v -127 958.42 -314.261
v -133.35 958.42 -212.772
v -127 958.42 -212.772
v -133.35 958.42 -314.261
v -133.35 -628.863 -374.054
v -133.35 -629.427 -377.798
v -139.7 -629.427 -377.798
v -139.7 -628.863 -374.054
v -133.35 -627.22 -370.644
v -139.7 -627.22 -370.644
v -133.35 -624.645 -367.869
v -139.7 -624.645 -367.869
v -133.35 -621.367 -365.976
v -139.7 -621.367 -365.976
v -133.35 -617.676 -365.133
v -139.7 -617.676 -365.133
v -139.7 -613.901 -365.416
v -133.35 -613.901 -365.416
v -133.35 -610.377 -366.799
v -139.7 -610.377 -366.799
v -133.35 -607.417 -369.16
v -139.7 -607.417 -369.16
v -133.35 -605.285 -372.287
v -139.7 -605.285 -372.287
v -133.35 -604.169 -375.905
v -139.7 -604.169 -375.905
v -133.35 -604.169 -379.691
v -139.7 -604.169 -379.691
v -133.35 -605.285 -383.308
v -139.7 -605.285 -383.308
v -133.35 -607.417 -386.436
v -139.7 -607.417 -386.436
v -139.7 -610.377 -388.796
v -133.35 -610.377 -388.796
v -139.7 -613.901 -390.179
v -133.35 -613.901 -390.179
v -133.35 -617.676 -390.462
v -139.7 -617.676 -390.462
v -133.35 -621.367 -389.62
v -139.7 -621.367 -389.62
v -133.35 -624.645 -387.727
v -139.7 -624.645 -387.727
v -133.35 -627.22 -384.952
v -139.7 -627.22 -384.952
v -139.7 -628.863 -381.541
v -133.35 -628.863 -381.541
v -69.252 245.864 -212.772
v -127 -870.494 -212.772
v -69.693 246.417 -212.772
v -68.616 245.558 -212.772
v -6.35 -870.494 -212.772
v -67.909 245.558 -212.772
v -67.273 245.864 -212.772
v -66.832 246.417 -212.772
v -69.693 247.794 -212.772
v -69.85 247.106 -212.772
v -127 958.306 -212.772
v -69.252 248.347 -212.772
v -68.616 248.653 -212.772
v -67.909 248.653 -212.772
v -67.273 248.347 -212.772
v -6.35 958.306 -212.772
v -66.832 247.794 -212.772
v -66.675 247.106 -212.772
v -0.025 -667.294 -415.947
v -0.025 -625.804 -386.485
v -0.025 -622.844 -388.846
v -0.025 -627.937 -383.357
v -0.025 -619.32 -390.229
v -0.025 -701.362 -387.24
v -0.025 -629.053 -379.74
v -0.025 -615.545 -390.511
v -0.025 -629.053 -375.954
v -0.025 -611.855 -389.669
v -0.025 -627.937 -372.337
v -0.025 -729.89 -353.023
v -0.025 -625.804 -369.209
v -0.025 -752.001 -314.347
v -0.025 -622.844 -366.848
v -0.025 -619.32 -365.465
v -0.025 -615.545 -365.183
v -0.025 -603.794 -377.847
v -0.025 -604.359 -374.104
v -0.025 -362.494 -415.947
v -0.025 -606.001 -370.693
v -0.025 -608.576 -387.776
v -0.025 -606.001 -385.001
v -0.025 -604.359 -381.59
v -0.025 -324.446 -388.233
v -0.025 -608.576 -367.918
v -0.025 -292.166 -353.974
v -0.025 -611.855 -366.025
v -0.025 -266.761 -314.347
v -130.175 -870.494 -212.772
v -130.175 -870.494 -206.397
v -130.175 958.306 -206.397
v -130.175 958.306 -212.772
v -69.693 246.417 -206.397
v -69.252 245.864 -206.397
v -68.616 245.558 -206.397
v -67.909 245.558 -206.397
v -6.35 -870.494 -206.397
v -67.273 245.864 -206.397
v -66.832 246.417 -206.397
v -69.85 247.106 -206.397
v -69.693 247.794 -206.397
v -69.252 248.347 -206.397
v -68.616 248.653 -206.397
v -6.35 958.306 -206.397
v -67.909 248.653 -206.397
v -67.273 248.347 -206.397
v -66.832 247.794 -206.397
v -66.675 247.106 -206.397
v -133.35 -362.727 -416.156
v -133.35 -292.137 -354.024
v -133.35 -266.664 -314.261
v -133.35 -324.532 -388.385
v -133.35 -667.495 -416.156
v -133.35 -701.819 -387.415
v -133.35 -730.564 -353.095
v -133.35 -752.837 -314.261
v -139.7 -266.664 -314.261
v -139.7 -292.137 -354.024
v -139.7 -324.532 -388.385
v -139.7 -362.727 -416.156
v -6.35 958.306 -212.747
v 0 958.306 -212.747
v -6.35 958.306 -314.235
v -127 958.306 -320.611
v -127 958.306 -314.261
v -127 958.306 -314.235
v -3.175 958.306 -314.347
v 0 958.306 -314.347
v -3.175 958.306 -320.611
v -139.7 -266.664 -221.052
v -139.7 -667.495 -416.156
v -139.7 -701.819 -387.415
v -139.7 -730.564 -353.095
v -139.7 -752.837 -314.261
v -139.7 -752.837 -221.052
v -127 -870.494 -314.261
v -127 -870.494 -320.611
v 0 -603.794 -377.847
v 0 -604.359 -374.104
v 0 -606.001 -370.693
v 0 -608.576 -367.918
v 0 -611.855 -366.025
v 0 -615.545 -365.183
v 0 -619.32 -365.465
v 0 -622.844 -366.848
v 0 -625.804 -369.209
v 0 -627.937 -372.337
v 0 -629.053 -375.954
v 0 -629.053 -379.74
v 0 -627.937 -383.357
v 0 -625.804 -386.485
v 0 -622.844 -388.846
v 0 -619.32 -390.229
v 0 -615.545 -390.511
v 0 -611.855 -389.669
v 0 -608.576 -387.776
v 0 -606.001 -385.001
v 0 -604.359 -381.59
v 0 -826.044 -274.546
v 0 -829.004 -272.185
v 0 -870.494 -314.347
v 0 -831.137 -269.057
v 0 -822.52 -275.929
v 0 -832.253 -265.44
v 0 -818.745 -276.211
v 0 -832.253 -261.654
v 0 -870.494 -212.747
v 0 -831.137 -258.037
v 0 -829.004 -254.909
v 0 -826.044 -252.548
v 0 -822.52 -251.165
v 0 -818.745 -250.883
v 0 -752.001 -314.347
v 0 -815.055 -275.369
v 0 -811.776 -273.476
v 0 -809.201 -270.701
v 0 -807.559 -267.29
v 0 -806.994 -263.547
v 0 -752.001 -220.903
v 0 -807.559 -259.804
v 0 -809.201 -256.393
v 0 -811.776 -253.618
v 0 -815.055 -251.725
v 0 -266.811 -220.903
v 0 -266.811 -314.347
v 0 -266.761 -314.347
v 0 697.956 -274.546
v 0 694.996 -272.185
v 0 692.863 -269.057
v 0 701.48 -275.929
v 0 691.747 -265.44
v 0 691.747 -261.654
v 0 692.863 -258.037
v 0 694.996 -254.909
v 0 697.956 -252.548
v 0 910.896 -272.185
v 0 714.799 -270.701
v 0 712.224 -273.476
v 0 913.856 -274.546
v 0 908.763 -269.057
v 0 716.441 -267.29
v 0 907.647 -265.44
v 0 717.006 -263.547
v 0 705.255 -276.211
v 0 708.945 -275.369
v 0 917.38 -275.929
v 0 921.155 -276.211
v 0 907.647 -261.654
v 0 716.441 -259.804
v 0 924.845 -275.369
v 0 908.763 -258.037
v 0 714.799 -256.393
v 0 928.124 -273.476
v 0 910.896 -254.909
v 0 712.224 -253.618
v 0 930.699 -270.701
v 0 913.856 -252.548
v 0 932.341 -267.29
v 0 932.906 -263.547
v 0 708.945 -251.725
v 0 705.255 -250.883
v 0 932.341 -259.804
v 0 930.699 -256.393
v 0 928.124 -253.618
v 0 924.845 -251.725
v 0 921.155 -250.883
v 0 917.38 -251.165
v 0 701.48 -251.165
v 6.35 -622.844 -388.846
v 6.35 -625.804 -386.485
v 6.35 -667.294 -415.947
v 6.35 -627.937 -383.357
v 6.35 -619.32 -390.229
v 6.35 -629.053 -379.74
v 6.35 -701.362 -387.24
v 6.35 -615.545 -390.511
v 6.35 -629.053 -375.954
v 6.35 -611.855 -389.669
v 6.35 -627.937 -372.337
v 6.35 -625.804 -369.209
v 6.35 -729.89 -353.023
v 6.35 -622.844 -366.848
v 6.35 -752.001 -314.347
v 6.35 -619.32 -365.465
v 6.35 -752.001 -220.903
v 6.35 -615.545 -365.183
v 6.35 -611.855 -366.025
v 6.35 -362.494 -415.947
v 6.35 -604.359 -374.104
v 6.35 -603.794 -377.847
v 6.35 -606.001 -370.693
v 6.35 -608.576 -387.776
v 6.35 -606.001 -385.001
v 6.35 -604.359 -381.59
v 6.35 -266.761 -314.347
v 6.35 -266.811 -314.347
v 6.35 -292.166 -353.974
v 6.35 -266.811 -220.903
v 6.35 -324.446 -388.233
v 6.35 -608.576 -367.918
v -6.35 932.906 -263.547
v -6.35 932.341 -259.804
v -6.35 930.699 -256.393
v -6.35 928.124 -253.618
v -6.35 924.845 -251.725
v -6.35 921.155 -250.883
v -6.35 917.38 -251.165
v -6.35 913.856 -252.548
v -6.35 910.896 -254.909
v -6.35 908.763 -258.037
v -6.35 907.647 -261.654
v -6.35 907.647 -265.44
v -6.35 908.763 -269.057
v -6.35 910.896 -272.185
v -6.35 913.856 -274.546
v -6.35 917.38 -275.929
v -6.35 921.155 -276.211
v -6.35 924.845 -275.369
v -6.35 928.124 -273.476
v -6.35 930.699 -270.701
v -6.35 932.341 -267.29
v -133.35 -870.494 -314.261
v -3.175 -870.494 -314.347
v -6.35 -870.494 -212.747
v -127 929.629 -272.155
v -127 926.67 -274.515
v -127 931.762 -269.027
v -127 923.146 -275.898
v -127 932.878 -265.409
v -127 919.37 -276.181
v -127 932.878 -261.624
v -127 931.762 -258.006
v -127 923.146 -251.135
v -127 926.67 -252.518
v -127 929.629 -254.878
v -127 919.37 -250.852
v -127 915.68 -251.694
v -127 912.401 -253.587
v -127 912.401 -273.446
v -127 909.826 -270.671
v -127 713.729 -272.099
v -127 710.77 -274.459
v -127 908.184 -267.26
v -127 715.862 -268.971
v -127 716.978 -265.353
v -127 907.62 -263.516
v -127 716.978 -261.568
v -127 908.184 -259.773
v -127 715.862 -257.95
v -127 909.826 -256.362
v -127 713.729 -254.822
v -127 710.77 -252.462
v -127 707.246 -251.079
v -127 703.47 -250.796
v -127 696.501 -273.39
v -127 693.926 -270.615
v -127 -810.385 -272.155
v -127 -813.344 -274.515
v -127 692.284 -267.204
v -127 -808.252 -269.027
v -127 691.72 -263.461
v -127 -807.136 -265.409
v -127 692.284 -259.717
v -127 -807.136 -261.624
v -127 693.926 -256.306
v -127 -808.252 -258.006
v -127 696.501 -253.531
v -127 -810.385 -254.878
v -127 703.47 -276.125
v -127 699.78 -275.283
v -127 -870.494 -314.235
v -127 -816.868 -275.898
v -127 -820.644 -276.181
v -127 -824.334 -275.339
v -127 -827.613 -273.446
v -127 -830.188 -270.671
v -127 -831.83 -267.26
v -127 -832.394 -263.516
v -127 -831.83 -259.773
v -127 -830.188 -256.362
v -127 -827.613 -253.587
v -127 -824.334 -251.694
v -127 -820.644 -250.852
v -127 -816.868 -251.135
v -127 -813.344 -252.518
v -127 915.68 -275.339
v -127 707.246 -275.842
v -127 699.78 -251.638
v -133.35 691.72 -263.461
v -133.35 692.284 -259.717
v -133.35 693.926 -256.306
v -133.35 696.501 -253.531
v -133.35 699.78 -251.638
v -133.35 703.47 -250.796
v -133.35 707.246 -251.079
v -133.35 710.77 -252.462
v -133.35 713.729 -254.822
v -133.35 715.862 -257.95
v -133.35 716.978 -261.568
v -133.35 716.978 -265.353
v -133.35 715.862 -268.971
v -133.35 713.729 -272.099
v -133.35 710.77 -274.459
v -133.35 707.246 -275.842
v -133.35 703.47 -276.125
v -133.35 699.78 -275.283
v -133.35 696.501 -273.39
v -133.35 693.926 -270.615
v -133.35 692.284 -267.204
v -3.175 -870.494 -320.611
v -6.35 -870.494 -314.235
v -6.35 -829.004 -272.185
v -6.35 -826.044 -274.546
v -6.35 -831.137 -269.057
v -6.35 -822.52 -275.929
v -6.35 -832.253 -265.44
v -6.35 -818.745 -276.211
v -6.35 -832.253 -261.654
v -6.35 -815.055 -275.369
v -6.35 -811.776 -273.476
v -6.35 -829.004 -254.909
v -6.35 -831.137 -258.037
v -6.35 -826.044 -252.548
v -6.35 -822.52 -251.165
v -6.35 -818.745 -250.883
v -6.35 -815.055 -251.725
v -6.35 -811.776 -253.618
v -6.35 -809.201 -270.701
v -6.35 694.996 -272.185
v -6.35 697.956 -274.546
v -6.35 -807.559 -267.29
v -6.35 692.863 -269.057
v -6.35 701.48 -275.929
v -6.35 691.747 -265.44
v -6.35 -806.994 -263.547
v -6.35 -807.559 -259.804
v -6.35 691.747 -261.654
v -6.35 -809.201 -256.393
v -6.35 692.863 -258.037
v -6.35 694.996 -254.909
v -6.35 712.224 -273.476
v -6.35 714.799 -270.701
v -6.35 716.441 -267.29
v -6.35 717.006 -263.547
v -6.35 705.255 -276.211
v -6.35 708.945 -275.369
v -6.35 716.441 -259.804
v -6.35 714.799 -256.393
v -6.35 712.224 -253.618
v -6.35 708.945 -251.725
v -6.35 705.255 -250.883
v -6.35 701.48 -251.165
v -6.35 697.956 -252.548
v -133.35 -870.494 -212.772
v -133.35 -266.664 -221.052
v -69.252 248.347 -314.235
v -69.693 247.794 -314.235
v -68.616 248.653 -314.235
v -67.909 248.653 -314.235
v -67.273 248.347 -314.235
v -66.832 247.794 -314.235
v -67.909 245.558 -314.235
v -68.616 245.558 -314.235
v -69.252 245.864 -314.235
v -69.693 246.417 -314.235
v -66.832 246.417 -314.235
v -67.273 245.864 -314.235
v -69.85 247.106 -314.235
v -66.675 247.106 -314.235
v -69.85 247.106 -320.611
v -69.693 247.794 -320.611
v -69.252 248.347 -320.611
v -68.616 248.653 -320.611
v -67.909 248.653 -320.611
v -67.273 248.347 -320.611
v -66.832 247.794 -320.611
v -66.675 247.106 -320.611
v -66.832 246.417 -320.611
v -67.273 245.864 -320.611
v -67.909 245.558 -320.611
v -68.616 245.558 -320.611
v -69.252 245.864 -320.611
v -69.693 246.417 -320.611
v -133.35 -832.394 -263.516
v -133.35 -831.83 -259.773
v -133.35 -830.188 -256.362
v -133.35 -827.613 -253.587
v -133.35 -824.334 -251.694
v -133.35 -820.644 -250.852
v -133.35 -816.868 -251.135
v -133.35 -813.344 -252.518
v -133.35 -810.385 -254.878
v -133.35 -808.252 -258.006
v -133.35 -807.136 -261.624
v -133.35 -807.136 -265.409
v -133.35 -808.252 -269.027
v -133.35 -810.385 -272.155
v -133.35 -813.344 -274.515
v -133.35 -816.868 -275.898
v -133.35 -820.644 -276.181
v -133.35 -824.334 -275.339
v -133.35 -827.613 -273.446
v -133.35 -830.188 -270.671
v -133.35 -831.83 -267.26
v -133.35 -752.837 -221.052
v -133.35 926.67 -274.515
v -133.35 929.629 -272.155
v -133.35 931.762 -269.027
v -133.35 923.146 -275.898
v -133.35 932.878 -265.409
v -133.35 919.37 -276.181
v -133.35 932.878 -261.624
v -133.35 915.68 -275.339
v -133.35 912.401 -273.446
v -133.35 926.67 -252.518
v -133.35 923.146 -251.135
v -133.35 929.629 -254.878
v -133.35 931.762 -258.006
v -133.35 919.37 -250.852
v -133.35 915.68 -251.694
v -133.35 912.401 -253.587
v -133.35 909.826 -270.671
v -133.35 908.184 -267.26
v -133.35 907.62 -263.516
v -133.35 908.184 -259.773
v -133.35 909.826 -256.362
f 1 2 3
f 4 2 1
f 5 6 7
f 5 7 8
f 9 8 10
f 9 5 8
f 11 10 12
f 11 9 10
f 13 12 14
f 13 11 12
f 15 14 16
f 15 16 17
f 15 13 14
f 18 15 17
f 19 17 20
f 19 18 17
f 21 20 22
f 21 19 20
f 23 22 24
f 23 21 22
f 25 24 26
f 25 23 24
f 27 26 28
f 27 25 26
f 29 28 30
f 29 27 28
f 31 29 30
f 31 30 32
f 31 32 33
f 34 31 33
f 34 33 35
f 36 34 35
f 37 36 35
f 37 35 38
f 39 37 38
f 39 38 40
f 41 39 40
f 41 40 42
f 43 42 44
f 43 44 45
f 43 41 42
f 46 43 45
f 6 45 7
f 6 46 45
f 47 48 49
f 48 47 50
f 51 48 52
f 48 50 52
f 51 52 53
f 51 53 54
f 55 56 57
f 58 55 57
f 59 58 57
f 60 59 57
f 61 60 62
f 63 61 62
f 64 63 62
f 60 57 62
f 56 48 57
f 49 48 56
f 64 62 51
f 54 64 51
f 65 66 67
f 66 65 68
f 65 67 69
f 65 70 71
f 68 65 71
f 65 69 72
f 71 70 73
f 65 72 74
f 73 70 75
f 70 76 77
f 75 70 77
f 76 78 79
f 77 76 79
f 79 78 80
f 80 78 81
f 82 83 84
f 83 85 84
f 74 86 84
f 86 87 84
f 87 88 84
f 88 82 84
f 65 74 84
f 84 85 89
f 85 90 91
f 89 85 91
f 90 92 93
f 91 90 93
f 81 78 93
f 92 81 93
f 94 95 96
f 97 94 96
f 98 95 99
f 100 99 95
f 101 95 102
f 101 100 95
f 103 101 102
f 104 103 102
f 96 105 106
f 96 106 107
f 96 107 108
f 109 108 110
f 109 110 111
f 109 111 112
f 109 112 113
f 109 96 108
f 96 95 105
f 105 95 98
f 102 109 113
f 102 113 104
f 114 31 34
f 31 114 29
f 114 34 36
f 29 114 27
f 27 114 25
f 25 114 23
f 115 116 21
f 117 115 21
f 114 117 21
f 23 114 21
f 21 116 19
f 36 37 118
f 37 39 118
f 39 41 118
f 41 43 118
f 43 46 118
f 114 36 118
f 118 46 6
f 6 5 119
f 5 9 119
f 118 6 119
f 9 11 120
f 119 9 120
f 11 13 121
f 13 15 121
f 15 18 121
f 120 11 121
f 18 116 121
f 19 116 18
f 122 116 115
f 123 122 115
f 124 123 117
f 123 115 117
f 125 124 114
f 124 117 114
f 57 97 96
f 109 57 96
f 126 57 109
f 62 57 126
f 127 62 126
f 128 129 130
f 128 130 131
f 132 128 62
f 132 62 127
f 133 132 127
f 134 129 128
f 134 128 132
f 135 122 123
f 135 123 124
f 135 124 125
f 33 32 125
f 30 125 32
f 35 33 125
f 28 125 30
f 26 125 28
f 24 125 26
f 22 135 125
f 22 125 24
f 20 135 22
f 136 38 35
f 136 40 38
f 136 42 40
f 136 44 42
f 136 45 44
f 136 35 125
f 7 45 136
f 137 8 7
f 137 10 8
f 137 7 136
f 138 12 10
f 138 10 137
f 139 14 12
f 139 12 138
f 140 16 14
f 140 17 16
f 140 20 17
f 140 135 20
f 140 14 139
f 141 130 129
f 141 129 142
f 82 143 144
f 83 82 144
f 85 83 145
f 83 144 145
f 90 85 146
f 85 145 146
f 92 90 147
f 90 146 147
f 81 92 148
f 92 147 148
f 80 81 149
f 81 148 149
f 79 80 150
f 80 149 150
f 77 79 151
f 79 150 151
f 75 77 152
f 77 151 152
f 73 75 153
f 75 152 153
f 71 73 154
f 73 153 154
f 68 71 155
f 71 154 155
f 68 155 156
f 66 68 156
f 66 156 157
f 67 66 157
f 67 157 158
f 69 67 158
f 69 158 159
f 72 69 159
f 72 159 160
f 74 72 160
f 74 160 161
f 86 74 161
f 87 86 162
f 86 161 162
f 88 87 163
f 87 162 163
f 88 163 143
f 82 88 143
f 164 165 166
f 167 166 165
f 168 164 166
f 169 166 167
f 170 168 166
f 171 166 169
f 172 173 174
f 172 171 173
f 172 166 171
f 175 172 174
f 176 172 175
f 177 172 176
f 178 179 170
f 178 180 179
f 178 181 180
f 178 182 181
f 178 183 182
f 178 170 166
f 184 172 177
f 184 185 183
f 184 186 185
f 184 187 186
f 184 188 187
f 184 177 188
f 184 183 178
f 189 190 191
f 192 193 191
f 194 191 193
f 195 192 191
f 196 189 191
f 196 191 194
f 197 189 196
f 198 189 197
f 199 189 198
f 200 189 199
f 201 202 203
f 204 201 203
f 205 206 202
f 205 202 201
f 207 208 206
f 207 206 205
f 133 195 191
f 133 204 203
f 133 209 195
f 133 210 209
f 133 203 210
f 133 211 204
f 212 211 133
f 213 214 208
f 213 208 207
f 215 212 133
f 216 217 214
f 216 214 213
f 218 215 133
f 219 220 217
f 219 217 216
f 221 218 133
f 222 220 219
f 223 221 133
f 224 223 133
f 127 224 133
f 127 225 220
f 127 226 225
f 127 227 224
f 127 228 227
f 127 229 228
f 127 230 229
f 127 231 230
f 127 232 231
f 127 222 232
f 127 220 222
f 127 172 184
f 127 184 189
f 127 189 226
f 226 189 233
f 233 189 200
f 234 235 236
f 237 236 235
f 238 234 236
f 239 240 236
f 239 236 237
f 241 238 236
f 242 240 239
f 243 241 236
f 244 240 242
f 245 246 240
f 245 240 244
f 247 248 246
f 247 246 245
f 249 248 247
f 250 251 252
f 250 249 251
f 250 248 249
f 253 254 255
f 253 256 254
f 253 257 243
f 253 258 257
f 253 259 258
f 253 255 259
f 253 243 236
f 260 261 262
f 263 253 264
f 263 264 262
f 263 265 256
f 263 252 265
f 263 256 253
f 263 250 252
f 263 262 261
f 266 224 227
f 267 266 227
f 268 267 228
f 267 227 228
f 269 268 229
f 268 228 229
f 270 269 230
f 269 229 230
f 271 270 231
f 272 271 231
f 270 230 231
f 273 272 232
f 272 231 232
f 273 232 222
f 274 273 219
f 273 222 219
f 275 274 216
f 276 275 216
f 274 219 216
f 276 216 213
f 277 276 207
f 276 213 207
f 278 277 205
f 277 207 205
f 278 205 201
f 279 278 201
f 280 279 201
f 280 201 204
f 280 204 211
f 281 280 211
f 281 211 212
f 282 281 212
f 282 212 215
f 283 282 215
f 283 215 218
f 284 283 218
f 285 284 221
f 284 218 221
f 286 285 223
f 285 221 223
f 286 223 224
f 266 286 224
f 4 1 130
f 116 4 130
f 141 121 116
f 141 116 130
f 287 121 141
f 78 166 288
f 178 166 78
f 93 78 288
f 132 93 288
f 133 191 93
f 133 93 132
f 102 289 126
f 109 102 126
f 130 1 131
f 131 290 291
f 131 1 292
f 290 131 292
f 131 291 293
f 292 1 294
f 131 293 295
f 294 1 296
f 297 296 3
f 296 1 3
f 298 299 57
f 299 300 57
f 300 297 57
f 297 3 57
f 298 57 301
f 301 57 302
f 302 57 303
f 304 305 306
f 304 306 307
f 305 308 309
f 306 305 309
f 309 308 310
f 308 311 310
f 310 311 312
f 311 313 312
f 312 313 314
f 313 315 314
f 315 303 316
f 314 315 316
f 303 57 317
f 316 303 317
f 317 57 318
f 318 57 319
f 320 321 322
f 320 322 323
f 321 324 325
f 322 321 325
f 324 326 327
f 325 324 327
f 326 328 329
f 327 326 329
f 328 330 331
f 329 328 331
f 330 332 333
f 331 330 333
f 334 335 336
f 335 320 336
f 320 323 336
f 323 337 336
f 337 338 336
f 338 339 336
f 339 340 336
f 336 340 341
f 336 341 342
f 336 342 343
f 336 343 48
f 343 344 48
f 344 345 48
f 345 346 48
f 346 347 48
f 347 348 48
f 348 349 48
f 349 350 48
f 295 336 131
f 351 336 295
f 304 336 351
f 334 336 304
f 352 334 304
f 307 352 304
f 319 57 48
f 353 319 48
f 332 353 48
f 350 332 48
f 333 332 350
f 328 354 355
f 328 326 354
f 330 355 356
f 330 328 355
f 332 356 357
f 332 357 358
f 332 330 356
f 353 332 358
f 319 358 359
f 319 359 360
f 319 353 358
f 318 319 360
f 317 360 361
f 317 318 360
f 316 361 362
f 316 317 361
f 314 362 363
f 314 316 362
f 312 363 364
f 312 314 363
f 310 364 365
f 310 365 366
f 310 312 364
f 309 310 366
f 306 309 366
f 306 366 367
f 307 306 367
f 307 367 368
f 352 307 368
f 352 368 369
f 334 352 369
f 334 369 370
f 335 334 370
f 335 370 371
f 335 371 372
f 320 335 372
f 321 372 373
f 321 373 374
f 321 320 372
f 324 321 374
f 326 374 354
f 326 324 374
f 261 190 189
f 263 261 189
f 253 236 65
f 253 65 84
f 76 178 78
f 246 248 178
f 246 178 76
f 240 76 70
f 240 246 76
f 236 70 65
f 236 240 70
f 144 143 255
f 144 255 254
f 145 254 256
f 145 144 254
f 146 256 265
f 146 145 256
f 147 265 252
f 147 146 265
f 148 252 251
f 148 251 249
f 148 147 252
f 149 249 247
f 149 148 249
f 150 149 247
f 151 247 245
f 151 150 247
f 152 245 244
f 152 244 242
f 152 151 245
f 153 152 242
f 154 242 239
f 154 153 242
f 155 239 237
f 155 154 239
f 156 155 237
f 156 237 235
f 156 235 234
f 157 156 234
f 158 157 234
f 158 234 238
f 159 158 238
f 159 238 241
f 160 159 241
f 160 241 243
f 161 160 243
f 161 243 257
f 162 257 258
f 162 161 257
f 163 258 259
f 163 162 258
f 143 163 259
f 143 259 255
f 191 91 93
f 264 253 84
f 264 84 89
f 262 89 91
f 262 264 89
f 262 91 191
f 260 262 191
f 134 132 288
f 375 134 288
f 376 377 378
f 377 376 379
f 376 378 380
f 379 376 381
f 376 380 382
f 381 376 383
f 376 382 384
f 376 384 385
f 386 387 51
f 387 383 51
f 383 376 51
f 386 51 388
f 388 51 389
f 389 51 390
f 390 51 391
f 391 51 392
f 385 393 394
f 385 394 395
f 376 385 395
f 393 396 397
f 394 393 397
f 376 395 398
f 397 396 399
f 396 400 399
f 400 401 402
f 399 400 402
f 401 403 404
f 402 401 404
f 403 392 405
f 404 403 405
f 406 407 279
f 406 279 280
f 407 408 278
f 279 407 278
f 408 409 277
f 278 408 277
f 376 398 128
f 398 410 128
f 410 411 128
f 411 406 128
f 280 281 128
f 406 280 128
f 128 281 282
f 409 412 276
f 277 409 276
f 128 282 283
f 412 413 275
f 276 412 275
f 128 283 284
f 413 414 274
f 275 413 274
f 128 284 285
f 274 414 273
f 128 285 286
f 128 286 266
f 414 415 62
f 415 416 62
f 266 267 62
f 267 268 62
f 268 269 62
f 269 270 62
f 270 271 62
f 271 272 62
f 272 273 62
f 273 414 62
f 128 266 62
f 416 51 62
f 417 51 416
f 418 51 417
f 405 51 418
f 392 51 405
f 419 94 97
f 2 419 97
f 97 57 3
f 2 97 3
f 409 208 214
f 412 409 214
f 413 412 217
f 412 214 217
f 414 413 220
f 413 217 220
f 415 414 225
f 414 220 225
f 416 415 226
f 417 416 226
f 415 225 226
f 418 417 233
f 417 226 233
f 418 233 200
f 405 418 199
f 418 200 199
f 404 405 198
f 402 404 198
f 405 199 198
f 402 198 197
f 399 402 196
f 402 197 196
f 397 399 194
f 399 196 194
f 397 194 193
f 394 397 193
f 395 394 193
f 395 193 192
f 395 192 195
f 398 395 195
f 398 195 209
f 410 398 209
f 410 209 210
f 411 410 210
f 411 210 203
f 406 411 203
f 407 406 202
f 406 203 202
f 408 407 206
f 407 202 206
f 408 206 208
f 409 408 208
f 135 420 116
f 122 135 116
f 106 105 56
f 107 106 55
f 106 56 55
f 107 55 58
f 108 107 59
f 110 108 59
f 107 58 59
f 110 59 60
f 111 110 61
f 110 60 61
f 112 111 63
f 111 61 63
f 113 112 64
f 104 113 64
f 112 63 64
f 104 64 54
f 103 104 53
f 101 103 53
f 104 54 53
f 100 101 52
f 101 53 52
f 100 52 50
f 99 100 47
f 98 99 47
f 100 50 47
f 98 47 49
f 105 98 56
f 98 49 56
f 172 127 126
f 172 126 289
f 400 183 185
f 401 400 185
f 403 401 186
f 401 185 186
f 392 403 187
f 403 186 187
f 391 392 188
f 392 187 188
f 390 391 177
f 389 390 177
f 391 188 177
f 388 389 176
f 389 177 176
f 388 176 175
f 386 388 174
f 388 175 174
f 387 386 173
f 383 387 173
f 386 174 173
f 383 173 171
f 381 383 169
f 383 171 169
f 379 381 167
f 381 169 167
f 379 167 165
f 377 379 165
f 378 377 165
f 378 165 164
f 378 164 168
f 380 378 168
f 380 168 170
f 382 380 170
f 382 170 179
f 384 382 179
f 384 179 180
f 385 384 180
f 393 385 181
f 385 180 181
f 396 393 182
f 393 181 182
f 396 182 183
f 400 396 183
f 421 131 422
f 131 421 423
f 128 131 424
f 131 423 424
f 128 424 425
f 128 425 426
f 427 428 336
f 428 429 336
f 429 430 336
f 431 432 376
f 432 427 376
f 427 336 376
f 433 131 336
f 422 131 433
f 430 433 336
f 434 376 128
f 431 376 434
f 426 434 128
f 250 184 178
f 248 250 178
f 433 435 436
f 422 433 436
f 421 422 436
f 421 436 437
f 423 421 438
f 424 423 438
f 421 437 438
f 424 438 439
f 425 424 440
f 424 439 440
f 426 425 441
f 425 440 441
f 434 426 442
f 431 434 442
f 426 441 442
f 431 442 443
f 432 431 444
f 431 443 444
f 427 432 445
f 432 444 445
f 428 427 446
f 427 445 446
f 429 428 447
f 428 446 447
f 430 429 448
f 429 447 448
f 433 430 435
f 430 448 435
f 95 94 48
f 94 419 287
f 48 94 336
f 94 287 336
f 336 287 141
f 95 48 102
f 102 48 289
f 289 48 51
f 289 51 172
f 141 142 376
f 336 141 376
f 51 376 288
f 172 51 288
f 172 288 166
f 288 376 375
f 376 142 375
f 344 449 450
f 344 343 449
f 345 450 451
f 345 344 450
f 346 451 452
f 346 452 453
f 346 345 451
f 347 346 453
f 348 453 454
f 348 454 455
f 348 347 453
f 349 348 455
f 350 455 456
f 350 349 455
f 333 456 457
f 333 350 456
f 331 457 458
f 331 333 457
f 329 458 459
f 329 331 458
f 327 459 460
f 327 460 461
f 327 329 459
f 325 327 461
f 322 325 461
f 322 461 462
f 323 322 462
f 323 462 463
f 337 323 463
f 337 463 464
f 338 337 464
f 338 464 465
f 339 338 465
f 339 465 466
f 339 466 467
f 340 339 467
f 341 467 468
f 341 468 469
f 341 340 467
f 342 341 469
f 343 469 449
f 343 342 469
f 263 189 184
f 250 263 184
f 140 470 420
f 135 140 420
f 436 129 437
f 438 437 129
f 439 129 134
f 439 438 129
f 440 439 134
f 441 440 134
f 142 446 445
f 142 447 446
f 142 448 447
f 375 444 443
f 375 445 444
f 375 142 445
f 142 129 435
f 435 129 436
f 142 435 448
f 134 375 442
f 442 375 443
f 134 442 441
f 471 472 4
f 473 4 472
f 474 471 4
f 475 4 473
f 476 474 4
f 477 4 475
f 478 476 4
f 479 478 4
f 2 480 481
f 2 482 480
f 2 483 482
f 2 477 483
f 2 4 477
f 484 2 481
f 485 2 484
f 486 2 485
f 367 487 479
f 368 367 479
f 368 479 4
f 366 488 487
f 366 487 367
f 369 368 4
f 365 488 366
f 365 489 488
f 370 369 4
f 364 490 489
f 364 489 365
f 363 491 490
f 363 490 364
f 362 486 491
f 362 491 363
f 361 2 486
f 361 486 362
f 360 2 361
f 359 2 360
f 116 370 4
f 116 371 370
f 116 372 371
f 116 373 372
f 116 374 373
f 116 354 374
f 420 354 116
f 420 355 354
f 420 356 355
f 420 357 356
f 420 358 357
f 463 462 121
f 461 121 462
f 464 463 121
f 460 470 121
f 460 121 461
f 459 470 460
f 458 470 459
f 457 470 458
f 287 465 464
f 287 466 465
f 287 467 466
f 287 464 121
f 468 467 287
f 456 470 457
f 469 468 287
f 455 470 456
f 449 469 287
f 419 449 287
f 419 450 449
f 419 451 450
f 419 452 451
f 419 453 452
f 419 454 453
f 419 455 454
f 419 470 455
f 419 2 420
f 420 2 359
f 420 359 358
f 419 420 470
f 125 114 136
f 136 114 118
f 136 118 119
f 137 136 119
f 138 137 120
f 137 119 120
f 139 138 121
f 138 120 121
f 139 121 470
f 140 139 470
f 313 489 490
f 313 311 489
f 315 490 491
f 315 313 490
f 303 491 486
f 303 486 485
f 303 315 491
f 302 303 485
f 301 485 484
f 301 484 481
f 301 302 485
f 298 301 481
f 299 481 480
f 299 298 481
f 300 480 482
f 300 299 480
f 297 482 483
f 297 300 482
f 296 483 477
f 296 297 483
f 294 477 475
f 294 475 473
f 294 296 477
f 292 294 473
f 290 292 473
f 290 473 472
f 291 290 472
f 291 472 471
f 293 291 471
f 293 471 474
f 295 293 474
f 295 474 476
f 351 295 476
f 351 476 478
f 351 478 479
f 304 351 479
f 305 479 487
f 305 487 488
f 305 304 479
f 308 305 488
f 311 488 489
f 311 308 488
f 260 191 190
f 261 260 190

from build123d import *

# Parameters (mm, degrees)
F0_R          = 12.7
F1_DEPTH      = 6.35
F0_W          = 304.8
F0_H          = 101.6
F2_DEPTH      = 6.35
F2_DEPTH_BACK = 0.0254
F3_W          = 123.825
F3_H          = 1828.8
F4_DEPTH      = 6.35
F4_DEPTH_BACK = 0.0254
F5_R          = 12.7
F6_DEPTH      = 3.175
F6_DEPTH_BACK = 3.175
F7_W          = 123.825
F7_H          = 1828.8
F8_DEPTH      = 6.35
F8_DEPTH_BACK = 0.0254
F9_W          = 304.768414
F9_H          = 101.895114
F9_R          = 12.7
F10_DEPTH     = 6.35
F12_D         = 3.175


with BuildPart() as f1:
    # F0 (on Right) → F1 (new body)
    with BuildSketch(Plane.YZ):
        Polygon((958.305541, -212.746999), (-870.494459, -212.746999), (-870.494459, -314.346999), (-752.001264, -314.346999), (-752.001264, -220.903009), (-266.81143, -220.903009), (-266.81143, -314.346999), (-266.760536, -314.346999), (958.305541, -314.346999), align=None)
        with Locations((-819.694459, -263.546999)):
            Circle(F0_R, mode=Mode.SUBTRACT)
        with Locations((704.305541, -263.546999)):
            Circle(F0_R, mode=Mode.SUBTRACT)
        with Locations((920.205541, -263.546999)):
            Circle(F0_R, mode=Mode.SUBTRACT)
        Polygon((-752.001264, -220.903009), (-752.001264, -314.346999), (-667.294459, -314.346999), (-362.494459, -314.346999), (-266.81143, -314.346999), (-266.81143, -220.903009), align=None)
    extrude(amount=-F1_DEPTH)

    # F0 (on Right) → F2 (join, two sides)
    with BuildSketch(Plane.YZ) as f2_sk:
        Polygon((-752.001264, -220.903009), (-752.001264, -314.346999), (-667.294459, -314.346999), (-362.494459, -314.346999), (-266.81143, -314.346999), (-266.81143, -220.903009), align=None)
        with BuildLine():
            Line((-667.294459, -314.346999), (-752.001264, -314.346999))
            ThreePointArc((-752.001264, -314.346999), (-716.377908, -370.75803), (-667.294459, -415.946999))
            Line((-667.294459, -415.946999), (-667.294459, -314.346999))
        make_face()
        with Locations((-514.894459, -365.146999)):
            Rectangle(F0_W, F0_H)
        with Locations((-616.494459, -377.846999)):
            Circle(F0_R, mode=Mode.SUBTRACT)
        with BuildLine():
            ThreePointArc((-362.494459, -415.946999), (-307.510614, -371.852975), (-266.760536, -314.346999))
            Line((-266.760536, -314.346999), (-266.81143, -314.346999))
            Line((-266.81143, -314.346999), (-362.494459, -314.346999))
            Line((-362.494459, -314.346999), (-362.494459, -415.946999))
        make_face()
    extrude(amount=F2_DEPTH)
    extrude(f2_sk.sketch, amount=-F2_DEPTH_BACK)

    # F3 (on face) → F4 (join, two sides)
    with BuildSketch(Plane.XY.offset(-212.746999)) as f4_sk:
        with Locations((-68.2625, 43.905541)):
            Rectangle(F3_W, F3_H)
    extrude(amount=F4_DEPTH)
    extrude(f4_sk.sketch, amount=-F4_DEPTH_BACK)

    # F5 (on face) → F6 (join, two sides)
    with BuildSketch(Plane(origin=(-130.175, 0, 0), x_dir=(0, -1, 0), z_dir=(-1, 0, 0))) as f6_sk:
        Polygon((870.494459, -314.260572), (870.494459, -212.772399), (-958.305541, -212.772399), (-958.419502, -212.772399), (-958.419502, -314.260572), align=None)
        with Locations((-920.319502, -263.516486)):
            Circle(F5_R, mode=Mode.SUBTRACT)
        with Locations((-704.419502, -263.460572)):
            Circle(F5_R, mode=Mode.SUBTRACT)
        with Locations((819.694459, -263.516486)):
            Circle(F5_R, mode=Mode.SUBTRACT)
    extrude(amount=F6_DEPTH)
    extrude(f6_sk.sketch, amount=-F6_DEPTH_BACK)

    # F7 (on face) → F8 (join, two sides)
    with BuildSketch(Plane(origin=(0, 0, -314.260572), x_dir=(1, 0, 0), z_dir=(0, 0, -1))) as f8_sk:
        with Locations((-65.0875, -43.905541)):
            Rectangle(F7_W, F7_H)
    extrude(amount=F8_DEPTH)
    extrude(f8_sk.sketch, amount=-F8_DEPTH_BACK)

    # F9 (on face) → F10 (join)
    with BuildSketch(Plane(origin=(-133.35, 0, 0), x_dir=(0, -1, 0), z_dir=(-1, 0, 0))):
        Polygon((752.8369, -221.051976), (266.6637, -221.051976), (266.6637, -314.260572), (362.727041, -314.260572), (667.495455, -314.260572), (752.8369, -314.260572), align=None)
        with BuildLine():
            Line((362.727041, -314.260572), (266.6637, -314.260572))
            ThreePointArc((266.6637, -314.260572), (307.534376, -371.959278), (362.727041, -416.155686))
            Line((362.727041, -416.155686), (362.727041, -314.260572))
        make_face()
        with Locations((515.111248, -365.208129)):
            Rectangle(F9_W, F9_H)
        with Locations((616.727041, -377.797782)):
            Circle(F9_R, mode=Mode.SUBTRACT)
        with BuildLine():
            ThreePointArc((667.495455, -416.155686), (716.949255, -370.889243), (752.8369, -314.260572))
            Line((752.8369, -314.260572), (667.495455, -314.260572))
            Line((667.495455, -314.260572), (667.495455, -416.155686))
        make_face()
    extrude(amount=F10_DEPTH)

    # F12 (through all)
    with Locations(Plane.XY.offset(-206.396999)):
        with Locations((-68.2625, 247.105541)):
            Hole(F12_D / 2)


solid = f1.part
